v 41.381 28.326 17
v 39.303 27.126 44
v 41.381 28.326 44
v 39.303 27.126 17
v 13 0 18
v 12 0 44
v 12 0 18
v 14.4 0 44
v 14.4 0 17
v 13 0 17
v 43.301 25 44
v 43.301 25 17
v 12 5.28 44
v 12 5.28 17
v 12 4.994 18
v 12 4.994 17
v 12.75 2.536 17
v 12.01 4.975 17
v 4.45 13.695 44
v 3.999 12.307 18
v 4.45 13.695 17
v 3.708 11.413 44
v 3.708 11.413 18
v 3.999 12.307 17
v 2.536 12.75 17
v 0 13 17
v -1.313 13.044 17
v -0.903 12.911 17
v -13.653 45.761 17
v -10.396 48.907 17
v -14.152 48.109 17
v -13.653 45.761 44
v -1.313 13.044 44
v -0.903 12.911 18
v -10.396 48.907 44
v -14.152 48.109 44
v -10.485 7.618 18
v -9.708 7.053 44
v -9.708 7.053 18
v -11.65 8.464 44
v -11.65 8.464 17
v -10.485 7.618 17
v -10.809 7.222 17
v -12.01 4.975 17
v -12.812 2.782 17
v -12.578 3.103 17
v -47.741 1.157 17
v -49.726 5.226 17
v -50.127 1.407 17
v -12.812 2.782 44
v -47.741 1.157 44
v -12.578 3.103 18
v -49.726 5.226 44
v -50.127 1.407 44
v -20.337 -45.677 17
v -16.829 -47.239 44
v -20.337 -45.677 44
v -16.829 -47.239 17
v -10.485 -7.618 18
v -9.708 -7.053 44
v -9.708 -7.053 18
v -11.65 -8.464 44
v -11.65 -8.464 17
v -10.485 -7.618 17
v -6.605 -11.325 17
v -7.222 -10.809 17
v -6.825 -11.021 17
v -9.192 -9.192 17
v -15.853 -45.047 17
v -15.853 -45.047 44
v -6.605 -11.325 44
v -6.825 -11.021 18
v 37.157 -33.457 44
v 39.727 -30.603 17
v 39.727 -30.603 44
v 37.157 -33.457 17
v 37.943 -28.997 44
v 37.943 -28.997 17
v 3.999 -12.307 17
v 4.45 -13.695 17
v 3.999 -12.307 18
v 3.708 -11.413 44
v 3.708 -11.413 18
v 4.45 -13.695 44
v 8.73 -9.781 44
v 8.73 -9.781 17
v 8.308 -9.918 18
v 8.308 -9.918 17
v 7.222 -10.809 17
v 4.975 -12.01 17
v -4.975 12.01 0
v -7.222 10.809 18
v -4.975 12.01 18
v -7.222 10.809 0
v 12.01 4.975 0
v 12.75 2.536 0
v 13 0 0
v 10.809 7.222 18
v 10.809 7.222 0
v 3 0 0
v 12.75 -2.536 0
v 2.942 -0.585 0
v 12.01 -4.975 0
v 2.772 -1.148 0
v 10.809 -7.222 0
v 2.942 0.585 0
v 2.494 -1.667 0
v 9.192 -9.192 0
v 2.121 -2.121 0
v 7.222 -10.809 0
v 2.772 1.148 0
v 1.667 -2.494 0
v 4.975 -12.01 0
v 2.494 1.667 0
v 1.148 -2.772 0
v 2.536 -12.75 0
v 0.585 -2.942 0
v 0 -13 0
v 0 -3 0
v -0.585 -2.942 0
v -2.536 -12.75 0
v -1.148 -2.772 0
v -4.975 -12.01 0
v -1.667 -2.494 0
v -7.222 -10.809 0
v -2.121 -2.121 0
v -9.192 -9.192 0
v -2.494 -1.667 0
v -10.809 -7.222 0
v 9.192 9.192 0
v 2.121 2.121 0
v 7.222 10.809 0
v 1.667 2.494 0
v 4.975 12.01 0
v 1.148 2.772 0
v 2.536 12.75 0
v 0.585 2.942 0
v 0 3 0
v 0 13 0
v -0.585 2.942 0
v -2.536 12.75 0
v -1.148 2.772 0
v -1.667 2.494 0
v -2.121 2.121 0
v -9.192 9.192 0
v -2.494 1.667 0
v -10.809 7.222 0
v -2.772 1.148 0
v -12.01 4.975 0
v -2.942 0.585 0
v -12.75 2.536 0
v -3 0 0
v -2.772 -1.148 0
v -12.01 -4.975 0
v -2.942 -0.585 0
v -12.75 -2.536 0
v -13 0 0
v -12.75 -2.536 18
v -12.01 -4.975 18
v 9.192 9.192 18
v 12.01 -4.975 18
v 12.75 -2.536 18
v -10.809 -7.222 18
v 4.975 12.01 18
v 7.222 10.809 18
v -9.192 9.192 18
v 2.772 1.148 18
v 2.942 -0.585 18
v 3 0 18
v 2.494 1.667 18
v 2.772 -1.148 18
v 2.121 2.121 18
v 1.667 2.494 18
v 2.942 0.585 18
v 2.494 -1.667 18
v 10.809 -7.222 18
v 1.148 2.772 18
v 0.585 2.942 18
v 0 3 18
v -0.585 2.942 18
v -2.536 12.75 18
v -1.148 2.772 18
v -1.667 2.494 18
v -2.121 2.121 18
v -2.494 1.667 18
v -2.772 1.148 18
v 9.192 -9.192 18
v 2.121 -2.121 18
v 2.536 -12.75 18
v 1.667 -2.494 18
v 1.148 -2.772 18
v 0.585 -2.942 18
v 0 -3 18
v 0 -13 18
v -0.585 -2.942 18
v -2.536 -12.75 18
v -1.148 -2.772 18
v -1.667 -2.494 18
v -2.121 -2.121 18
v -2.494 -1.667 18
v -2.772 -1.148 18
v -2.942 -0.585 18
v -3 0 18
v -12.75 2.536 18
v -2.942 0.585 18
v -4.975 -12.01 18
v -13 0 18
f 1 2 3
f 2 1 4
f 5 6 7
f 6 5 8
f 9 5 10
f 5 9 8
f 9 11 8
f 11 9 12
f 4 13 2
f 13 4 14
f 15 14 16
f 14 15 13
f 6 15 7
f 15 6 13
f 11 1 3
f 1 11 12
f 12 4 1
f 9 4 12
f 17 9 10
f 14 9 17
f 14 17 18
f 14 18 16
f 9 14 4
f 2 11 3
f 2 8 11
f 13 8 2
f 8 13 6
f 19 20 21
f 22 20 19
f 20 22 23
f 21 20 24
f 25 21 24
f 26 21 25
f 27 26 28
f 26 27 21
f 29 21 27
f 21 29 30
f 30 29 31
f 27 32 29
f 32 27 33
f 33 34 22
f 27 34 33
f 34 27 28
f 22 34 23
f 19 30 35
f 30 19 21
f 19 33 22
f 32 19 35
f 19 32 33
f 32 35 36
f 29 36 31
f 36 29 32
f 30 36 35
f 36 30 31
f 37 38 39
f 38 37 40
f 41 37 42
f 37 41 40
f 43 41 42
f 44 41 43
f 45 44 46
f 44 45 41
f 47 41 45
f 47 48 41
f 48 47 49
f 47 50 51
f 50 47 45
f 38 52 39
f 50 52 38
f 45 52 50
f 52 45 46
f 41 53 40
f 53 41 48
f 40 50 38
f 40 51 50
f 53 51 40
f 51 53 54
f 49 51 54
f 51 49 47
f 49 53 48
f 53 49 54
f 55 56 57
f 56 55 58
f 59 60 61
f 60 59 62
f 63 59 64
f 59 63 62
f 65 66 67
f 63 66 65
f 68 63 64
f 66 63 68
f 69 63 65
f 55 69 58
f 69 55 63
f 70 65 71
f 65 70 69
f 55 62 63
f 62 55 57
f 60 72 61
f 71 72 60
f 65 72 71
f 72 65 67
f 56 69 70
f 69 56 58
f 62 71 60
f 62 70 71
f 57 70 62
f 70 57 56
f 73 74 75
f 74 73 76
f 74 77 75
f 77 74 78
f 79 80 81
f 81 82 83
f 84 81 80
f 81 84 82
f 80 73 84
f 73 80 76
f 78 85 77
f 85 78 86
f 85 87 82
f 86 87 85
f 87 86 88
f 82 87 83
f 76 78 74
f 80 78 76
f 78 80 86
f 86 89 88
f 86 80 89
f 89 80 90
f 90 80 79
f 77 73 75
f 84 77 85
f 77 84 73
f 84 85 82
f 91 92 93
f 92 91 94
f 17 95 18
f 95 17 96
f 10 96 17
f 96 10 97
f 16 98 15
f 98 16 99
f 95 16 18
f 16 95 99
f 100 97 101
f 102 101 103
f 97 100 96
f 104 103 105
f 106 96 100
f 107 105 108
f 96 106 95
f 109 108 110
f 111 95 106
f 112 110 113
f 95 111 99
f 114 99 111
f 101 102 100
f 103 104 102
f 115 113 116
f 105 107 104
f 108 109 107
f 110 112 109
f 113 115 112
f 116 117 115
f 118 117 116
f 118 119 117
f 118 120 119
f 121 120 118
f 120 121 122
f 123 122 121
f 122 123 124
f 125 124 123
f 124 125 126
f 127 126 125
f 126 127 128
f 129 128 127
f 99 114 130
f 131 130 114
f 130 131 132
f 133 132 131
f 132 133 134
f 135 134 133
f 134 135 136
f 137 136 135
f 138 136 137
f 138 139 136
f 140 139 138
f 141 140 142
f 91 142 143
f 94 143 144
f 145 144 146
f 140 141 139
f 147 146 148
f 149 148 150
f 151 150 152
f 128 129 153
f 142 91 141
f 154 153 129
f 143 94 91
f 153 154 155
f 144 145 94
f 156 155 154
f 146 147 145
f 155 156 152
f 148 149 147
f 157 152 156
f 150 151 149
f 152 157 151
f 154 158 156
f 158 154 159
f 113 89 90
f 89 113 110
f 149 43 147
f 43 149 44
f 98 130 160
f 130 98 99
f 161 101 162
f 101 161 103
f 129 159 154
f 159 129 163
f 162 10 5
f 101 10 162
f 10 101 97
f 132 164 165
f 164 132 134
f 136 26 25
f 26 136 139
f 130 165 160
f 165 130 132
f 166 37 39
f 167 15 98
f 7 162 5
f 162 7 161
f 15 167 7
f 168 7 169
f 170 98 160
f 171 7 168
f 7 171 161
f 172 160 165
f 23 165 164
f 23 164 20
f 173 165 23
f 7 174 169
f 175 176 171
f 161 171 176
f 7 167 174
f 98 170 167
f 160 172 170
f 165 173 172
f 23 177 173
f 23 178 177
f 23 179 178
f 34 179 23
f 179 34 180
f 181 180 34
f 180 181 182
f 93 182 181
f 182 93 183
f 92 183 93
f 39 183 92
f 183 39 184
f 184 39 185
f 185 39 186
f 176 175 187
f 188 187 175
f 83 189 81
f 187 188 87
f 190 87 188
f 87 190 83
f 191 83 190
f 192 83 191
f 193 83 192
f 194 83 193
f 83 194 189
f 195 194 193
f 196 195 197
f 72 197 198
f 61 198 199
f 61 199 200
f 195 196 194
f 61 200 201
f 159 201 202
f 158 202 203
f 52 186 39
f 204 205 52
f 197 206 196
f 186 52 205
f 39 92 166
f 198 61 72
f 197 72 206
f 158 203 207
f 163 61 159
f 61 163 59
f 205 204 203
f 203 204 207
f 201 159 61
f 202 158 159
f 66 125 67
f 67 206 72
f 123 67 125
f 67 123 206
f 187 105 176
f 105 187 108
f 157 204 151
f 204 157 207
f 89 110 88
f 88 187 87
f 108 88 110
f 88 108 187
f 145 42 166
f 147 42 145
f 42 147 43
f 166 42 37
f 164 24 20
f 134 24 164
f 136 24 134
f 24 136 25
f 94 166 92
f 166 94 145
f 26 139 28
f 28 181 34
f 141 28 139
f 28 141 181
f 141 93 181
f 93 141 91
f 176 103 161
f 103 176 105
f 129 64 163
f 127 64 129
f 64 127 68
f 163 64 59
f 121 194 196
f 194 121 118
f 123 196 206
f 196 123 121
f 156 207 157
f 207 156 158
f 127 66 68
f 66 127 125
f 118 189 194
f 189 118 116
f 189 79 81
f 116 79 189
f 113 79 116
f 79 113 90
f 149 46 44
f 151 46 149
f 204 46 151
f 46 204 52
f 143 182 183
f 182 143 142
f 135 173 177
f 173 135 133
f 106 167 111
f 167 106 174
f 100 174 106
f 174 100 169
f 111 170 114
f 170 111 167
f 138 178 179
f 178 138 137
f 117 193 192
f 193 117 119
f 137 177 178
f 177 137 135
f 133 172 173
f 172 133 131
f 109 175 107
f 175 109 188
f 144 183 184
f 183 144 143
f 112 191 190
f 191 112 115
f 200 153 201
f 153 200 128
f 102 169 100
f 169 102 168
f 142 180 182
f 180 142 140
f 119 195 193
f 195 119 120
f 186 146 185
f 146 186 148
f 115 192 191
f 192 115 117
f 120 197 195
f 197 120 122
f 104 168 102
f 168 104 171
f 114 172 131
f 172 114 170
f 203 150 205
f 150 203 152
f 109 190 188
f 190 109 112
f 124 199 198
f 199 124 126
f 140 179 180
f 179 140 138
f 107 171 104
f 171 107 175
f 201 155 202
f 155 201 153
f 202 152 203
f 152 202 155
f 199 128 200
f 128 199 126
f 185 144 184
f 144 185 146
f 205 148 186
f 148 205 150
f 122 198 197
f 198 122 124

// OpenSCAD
$fn = 32;

// ----------------------------------------------------------------------
// Impeller: 100 mm, 5 blades, 44 mm tall
// ----------------------------------------------------------------------

// --- parameters (mm) ---
boss_d = 26;              // hub diameter
boss_h = 18;              // hub height
rotor_d = 100;            // outer diameter over the blades
vane_count = 5;           // number of blades
blade_t = 2.4;            // blade thickness
blade_h = 26;             // blade height
blade_in_r = 12;          // blade root radius
blade_out_r = 47.6;       // blade tip radius
sweep = 30;               // blade sweep, degrees
bore_d = 6;               // shaft bore

module hub() {
  cylinder(h = boss_h, d = boss_d);
}

module blade() {
  /* blade swept between two boxes: hull of the root and the tip section */
  hull() {
    translate([blade_in_r, 0, boss_h - 1])
      cube([blade_t, blade_t * 2.2, blade_h + 1], center = false);
    rotate([0, 0, sweep])
      translate([blade_out_r, 0, boss_h - 1])
        cube([blade_t, blade_t * 1.6, blade_h + 1], center = false);
  }
}

module blades() {
  for (i = [0 : vane_count - 1])
    rotate([0, 0, i * 360 / vane_count]) blade();
}

difference() {
  union() {
    hub();
    blades();
  }
  translate([0, 0, -1]) cylinder(h = boss_h + blade_h + 0 + 3, d = bore_d);
}
